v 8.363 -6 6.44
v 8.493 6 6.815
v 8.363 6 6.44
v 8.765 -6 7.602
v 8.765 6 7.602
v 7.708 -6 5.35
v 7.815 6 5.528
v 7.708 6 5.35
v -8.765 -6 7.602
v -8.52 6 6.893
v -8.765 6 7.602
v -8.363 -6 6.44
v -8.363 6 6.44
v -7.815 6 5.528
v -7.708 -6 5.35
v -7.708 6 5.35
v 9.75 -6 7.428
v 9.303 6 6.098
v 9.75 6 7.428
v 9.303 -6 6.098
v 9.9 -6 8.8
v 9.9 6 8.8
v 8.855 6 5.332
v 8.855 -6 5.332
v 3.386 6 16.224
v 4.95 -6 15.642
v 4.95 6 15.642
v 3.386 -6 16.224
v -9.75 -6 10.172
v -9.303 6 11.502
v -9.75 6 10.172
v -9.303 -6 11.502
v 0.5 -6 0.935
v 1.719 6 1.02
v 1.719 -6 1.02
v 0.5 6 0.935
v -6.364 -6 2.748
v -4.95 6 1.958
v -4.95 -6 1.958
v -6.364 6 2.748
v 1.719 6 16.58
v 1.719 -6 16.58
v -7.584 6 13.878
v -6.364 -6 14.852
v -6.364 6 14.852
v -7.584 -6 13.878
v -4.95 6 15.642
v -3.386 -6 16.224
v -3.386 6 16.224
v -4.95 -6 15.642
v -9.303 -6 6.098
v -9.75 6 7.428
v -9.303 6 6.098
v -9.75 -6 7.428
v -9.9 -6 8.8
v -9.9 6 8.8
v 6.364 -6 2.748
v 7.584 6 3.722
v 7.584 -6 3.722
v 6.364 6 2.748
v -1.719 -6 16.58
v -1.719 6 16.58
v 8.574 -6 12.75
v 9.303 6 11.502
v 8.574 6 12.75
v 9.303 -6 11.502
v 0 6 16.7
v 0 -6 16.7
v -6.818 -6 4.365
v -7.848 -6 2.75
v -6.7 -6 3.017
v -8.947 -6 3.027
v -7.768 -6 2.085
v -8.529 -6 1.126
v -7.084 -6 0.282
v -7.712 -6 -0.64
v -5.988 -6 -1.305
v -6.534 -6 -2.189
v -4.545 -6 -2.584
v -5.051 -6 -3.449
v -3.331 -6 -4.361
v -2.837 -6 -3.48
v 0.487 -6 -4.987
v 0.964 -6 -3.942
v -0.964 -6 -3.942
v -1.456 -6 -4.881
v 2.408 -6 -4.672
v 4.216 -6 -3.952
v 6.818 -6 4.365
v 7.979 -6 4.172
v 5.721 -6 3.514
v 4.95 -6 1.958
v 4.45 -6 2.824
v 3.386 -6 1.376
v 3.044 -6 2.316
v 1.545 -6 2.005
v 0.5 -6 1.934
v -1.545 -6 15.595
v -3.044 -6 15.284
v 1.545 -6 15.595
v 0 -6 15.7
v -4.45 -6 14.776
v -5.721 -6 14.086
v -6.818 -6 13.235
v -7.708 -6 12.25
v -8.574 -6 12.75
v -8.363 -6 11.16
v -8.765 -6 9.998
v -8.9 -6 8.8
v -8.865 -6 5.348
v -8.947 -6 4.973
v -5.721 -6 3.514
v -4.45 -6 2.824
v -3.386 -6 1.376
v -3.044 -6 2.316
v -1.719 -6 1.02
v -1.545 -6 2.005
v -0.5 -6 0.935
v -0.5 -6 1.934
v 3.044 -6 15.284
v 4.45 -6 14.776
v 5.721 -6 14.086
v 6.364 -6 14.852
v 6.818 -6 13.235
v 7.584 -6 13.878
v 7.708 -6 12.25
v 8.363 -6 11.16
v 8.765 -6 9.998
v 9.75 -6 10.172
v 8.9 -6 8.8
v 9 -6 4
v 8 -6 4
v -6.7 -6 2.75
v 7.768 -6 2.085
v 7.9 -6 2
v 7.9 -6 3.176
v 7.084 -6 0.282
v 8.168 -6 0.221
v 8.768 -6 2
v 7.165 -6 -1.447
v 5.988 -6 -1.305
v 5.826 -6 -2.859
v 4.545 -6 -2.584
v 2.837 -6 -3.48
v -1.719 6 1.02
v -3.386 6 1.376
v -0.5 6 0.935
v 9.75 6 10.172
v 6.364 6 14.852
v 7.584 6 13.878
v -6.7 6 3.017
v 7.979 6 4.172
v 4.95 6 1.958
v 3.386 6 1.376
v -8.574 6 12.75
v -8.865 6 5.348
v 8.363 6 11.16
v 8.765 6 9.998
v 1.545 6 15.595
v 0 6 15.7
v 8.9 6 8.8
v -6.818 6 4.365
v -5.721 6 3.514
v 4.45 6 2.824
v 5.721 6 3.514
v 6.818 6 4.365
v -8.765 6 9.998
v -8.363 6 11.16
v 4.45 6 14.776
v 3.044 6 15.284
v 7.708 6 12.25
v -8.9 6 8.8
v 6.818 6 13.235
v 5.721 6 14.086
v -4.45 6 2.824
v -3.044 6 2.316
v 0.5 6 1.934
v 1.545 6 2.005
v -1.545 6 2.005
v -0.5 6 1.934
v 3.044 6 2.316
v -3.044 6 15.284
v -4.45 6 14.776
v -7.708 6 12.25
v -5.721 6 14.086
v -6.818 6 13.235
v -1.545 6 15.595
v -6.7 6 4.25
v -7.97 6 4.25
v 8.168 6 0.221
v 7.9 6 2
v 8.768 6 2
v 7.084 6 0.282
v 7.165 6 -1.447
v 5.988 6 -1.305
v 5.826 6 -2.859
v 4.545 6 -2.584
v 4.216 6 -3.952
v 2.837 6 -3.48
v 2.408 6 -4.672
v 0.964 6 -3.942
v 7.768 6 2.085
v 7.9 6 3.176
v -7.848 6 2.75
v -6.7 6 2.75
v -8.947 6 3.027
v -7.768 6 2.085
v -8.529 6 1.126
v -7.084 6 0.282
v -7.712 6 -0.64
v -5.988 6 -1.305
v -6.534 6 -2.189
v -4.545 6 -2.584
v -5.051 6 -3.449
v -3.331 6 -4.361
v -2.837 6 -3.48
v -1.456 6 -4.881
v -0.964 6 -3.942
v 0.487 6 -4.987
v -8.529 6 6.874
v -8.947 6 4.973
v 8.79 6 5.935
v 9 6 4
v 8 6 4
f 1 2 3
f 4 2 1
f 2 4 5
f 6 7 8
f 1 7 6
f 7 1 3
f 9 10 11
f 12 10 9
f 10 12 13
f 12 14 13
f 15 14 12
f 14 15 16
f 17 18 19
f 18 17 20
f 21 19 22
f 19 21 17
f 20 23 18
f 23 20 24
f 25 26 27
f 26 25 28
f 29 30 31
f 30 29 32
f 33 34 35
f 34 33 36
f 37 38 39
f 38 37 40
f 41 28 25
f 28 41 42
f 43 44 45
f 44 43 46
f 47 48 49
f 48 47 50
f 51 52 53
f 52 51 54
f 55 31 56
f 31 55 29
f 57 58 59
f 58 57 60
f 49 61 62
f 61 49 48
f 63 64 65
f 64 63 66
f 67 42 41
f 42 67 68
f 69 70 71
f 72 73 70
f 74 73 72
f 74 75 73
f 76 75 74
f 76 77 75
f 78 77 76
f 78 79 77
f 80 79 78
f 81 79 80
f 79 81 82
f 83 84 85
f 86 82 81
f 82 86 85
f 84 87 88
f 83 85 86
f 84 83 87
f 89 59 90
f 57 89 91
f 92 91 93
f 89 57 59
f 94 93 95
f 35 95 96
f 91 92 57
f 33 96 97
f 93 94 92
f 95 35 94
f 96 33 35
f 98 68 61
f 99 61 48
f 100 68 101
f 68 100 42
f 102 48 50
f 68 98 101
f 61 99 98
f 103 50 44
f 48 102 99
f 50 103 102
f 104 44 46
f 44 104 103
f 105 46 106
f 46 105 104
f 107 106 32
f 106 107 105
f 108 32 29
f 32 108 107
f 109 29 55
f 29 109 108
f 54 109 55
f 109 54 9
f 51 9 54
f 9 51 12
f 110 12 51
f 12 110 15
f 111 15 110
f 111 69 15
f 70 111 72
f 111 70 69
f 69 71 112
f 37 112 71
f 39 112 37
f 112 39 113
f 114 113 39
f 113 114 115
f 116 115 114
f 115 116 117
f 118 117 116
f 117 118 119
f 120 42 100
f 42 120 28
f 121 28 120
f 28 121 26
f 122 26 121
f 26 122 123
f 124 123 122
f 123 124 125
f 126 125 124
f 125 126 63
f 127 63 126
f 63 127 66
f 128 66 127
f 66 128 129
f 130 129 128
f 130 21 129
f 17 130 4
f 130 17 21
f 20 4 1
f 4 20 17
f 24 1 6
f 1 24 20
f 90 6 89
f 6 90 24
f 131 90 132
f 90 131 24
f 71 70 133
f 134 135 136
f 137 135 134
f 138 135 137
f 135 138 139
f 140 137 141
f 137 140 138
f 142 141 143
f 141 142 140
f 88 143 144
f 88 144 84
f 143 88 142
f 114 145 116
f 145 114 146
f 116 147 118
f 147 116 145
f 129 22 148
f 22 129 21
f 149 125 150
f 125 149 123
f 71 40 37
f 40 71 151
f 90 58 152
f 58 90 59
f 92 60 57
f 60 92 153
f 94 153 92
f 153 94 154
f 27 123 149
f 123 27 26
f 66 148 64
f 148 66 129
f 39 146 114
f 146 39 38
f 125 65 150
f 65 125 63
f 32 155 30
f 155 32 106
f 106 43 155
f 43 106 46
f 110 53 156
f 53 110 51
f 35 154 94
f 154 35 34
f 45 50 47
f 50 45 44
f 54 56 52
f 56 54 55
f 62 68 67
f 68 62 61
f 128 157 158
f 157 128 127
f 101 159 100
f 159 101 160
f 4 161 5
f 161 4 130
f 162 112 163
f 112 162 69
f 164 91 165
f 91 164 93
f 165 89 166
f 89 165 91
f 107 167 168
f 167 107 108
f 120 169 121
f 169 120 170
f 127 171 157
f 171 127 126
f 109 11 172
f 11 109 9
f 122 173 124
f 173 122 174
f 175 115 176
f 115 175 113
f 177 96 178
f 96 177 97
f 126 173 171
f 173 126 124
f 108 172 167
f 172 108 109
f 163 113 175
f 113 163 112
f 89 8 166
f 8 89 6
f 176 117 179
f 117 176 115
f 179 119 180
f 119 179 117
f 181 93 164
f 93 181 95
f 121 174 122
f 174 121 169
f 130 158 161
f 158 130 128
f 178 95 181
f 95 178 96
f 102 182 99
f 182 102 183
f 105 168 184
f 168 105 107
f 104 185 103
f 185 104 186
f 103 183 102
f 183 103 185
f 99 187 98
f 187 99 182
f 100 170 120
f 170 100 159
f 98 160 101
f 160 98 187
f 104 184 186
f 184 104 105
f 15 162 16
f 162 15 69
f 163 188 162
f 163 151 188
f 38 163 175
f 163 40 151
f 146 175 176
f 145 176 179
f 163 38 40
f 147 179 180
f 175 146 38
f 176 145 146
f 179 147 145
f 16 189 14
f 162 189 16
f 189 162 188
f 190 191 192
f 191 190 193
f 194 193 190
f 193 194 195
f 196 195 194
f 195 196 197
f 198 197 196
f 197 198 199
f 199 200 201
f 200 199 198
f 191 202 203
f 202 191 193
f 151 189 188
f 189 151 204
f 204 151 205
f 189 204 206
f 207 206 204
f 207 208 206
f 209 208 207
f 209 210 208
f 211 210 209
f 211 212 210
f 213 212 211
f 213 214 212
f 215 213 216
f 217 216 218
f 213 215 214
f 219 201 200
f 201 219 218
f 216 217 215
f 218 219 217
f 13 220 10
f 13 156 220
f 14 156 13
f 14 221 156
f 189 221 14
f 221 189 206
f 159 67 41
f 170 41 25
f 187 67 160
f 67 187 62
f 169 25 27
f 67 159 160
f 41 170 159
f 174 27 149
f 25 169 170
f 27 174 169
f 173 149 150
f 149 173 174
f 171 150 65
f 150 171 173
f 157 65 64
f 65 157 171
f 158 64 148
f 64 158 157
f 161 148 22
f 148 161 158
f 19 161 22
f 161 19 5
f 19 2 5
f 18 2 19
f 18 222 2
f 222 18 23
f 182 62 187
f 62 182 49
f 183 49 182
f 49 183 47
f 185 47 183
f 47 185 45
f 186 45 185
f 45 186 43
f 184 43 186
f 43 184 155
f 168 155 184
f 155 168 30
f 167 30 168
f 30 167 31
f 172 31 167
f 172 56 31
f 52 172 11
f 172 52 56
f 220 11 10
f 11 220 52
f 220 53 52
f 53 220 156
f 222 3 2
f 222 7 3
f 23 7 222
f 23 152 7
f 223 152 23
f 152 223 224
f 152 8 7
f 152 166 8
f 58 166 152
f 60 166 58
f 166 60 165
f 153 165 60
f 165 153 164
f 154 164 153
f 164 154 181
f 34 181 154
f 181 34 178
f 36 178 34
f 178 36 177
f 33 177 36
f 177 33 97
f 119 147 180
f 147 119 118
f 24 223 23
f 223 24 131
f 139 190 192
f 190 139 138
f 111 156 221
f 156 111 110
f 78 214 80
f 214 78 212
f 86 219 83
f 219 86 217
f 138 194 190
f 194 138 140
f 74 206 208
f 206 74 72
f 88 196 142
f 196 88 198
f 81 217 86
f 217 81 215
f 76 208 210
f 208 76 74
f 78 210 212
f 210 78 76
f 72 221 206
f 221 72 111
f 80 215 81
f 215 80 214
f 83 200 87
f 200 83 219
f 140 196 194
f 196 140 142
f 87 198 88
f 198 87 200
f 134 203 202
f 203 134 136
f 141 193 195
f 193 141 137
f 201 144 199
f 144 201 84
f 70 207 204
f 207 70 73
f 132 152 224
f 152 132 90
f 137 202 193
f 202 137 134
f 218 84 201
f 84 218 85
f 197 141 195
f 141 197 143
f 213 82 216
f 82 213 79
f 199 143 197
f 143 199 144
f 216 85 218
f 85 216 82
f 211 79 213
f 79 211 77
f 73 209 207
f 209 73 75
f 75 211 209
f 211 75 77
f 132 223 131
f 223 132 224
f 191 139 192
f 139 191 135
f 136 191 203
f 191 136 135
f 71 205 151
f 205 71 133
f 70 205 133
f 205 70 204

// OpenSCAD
// Pulse Oximeter finger-clip
// V9

// Units are mm

module prism(l, w, h){
   polyhedron(
           points=[[0,0,0], [l,0,0], [l,w,0], [0,w,0], [0,w,h], [l,w,h]],
           faces=[[0,1,2,3],[5,4,3,2],[0,4,5,1],[0,3,4],[5,2,1]]
           );
}

// _______ Finger _______
// elliptic cylinder with rounded top
module elrdcyl(
   w, // width of finger
   d, // thickness of finger
   h1,// straight height of cylinder
   h2 // height of rounded top
   ) {
   intersection(){
     union(){
       scale([w/2,d/2,1])cylinder(r=1,h=h1,$fn=36);  // cylinder
       translate([0,0,h1])scale([w/2,d/2,h2])sphere(r=1,$fn=36);  // top
     }
     scale([w/2,d/2,1])cylinder(r=1,h=h1+h2,$fn=36); // only needed if h2>h1 
   }
}

fingerHeight = 17.8;
fingerWidth = 13.8;
module drawFinger() {
    translate([0, -(26-9), 8.8]) {
        rotate([-90, 0, 0]) {
            elrdcyl(fingerHeight,fingerWidth,29,7);
        }
    }
    translate([0, -(28-9), 8.8]) {
        rotate([-90, 0, 0]) {
            elrdcyl(fingerHeight,fingerWidth,5,0);
        }
    }
}

// _______ Finger Clip _______
module drawClip(thickness) {
    // Cylindrical part
    difference () {
        translate([0, -(thickness + 10), 8.8]) {
            rotate([-90, 0, 0]) {
                elrdcyl(fingerHeight + thickness, fingerWidth + thickness, 19 + thickness, 7 + thickness);
            }
        }
    }
}

union() {
    // Draw all of the parts
    translate([0, 6, 0]) {
        difference() {
            drawClip(2);
            union() {
                drawFinger();
                translate([0, 10, 10]) {
                    cube([20, 20, 20], center=true);
                }
                // Slot
                translate([0, -6, 2]) {
                    cube([1, 13, 8], center=true);
                }
            }
        }
    }

    // The wire clip
    difference() {
        translate([0, 0, 4]) {
            rotate([90, 0, 0]) {
                difference() {
                    cylinder(h=12, r1=9, r2=9, center=true);
                    cylinder(h=12, r1=8, r2=8, center=true);
                }
            }
        }
        union() {
            drawFinger();
            // Gap
            translate([9, 0, 3]) {
                cube([2.2, 13, 2], center=true);
            }
        }
    }
    // Strengthening
    translate([-7.7, 0, 3.5]) {
        cube([2, 12, 1.5], center=true);
    }
}
